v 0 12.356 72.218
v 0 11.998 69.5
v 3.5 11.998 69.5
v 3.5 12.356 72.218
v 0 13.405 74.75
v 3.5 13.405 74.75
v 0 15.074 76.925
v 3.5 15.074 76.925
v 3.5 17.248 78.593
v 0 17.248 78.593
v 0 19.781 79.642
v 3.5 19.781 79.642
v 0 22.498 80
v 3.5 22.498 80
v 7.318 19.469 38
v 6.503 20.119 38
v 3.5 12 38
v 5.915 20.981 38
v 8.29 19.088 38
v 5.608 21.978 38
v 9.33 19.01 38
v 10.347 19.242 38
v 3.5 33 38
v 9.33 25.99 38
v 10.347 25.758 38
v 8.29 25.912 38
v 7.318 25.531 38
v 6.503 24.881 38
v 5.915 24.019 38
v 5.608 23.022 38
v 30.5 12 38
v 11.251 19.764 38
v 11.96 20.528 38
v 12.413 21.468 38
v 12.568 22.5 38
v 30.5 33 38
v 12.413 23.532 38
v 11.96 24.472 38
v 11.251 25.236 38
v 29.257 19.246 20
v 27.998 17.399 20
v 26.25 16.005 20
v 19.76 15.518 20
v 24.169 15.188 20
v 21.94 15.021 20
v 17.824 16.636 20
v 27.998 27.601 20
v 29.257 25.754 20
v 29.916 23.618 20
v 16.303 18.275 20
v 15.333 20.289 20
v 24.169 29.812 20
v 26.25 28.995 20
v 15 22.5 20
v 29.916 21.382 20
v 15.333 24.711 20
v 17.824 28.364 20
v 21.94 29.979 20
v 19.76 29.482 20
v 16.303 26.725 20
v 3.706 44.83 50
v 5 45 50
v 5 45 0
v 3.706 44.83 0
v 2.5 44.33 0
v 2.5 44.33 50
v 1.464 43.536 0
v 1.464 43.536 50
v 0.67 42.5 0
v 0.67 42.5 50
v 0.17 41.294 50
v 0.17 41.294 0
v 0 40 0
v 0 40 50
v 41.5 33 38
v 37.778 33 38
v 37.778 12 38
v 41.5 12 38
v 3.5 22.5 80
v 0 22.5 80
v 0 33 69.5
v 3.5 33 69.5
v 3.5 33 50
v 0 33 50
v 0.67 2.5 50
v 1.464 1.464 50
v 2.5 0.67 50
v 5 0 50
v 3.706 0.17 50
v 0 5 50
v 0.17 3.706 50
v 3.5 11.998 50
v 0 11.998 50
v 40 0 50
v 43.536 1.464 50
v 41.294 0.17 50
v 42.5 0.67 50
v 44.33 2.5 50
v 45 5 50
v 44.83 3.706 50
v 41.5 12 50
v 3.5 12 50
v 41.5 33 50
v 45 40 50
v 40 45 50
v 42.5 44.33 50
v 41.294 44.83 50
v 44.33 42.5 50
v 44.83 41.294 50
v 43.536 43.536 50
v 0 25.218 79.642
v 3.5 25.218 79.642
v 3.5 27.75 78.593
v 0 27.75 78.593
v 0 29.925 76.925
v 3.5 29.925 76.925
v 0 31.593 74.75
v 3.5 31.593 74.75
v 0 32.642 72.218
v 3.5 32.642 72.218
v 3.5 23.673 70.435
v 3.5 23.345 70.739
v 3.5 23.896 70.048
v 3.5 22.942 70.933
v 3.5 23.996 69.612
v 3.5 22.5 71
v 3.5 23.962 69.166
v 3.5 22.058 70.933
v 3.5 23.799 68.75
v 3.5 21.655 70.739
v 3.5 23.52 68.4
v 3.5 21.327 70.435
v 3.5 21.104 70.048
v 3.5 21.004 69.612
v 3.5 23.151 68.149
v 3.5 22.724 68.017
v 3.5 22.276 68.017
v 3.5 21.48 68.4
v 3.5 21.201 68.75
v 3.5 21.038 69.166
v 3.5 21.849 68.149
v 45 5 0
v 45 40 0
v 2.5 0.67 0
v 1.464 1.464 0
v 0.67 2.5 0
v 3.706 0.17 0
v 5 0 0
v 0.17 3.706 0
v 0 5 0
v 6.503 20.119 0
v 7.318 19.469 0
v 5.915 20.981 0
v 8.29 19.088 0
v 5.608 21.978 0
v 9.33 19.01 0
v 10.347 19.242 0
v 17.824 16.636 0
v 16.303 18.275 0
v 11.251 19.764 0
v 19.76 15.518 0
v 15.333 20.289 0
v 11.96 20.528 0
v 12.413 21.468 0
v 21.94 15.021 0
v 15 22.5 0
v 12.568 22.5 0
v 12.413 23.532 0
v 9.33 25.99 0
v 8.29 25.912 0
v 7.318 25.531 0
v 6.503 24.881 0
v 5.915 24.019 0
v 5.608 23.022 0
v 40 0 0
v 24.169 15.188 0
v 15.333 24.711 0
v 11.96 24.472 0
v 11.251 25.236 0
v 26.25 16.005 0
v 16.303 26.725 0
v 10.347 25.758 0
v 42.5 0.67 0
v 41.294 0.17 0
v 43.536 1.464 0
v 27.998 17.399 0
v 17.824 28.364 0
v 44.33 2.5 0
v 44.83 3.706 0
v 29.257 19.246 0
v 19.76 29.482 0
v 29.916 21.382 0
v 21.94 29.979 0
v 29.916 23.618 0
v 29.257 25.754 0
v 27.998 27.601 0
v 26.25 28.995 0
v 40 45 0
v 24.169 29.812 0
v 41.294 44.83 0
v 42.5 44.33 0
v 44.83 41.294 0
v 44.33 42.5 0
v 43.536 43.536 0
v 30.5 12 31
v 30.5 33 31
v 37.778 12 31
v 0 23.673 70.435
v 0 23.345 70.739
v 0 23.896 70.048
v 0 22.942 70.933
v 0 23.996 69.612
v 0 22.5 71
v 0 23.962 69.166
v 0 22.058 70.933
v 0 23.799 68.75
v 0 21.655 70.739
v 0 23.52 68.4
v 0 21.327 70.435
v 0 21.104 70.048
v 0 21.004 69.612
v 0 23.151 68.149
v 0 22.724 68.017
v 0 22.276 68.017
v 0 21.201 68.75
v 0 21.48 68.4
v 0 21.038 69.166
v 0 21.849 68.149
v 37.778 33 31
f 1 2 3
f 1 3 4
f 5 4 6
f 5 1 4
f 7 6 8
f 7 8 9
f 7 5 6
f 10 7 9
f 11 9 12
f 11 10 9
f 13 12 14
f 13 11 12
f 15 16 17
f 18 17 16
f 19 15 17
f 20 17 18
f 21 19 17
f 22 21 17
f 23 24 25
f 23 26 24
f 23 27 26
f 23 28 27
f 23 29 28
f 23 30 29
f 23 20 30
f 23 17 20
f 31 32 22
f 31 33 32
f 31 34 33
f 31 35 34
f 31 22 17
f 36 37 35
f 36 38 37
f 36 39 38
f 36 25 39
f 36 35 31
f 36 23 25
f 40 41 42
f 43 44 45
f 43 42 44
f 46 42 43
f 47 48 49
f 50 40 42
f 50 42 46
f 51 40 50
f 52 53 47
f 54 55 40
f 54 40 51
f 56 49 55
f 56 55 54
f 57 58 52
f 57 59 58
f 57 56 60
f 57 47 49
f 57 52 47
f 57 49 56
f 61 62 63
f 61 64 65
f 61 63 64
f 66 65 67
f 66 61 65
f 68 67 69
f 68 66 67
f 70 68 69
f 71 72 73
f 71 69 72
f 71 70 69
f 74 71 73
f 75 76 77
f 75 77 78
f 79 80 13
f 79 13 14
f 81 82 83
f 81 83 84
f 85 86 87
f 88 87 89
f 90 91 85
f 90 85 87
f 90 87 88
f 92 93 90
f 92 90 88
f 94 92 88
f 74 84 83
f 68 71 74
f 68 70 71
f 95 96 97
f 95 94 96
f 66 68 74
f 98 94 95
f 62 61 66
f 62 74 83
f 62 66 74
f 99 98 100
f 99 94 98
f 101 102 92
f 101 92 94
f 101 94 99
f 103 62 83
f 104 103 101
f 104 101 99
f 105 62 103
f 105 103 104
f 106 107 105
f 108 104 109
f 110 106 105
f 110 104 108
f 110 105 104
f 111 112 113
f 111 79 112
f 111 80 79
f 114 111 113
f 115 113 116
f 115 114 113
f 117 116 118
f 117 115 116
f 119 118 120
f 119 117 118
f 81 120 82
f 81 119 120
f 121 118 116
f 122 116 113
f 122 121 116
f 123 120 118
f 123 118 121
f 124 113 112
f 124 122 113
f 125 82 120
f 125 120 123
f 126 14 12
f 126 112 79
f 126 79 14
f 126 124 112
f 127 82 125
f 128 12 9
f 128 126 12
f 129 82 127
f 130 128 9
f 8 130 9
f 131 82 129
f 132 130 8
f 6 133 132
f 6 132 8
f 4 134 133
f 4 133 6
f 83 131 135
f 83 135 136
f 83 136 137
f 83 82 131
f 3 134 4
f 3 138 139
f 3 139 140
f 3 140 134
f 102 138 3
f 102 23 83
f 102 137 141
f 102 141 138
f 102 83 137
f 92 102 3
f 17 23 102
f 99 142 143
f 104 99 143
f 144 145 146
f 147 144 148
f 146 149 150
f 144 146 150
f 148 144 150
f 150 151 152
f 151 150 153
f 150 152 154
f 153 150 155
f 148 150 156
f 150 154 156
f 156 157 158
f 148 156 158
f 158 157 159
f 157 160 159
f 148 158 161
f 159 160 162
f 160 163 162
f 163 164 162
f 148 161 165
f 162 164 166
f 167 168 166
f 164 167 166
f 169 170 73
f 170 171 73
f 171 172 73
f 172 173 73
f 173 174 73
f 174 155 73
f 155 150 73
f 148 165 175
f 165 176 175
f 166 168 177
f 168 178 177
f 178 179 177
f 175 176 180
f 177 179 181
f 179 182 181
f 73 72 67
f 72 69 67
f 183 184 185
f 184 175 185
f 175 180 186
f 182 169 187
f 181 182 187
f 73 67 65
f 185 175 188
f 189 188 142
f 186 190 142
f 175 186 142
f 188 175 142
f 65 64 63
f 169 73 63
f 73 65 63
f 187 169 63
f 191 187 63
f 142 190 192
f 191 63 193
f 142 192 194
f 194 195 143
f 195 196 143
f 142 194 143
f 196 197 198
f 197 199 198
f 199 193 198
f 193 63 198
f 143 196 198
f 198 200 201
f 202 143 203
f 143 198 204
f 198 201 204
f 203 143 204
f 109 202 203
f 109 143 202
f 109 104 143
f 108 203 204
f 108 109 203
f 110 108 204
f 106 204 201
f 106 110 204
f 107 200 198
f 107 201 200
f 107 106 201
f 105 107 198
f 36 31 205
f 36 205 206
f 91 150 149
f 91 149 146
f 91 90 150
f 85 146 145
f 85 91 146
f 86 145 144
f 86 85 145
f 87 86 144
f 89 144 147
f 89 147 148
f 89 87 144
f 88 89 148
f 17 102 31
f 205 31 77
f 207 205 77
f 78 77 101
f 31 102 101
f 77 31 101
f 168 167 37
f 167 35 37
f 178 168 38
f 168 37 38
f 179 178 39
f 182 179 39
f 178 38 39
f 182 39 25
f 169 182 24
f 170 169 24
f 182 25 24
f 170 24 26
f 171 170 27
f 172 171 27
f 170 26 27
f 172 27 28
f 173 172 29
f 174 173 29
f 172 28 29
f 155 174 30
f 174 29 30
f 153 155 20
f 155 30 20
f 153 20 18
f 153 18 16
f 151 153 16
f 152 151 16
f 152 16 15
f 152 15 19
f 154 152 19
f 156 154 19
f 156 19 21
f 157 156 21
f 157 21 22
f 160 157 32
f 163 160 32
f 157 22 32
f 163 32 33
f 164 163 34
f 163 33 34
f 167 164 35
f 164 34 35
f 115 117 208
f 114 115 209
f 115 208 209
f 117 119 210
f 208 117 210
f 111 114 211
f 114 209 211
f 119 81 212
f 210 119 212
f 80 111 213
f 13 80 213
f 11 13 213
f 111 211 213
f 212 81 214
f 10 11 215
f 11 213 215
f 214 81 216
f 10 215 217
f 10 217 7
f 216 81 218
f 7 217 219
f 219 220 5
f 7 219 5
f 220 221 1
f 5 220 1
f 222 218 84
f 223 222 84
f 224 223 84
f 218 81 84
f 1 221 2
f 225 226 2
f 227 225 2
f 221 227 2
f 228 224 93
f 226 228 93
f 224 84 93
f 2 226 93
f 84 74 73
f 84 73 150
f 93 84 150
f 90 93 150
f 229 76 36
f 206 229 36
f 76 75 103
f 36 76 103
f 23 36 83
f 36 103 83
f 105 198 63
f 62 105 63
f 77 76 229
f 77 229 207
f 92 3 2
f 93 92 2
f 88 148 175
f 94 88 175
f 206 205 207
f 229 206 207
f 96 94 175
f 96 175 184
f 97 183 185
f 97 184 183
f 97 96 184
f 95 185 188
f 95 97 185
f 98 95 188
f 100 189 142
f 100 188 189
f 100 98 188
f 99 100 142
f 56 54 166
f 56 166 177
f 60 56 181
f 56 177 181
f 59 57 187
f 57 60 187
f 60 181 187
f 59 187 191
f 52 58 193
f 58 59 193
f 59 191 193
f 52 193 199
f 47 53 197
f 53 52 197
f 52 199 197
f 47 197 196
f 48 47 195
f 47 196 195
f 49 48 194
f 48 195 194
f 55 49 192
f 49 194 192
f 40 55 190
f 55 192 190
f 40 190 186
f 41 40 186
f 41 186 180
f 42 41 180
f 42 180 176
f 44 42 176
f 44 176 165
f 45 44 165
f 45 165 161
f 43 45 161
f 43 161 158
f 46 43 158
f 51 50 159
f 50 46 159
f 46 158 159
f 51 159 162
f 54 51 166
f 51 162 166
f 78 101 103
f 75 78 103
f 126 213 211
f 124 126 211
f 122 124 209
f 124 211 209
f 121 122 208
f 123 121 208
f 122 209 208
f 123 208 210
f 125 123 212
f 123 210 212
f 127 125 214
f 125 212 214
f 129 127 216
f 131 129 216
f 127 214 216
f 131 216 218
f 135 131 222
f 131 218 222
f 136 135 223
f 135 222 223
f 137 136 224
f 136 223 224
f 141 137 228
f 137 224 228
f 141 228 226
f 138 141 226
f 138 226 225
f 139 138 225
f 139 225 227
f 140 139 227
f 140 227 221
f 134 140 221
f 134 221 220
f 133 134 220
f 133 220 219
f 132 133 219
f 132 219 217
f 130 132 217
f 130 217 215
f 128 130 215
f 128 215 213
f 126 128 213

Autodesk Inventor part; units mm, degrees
ref_plane "YZ Plane" through (0, 0, 0) normal (1, 0, 0) x (0, 1, 0)
ref_plane "XZ Plane" through (0, 0, 0) normal (0, 1, 0) x (-1, 0, 0)
ref_plane "XY Plane" through (0, 0, 0) normal (0, 0, 1) x (1, 0, 0)
sketch "Sketch1" plane through (0, 0, 0) normal (0, 0, 1) x (1, 0, 0)
  line L0 (0, 0) -> (45, 0)
  line L1 (45, 0) -> (45, 45)
  line L2 (45, 45) -> (0, 45)
  line L3 (0, 45) -> (0, 0)
  dimension "d0" = 45
  dimension "d1" = 45
extrude "Extrusion1" add sketch "Sketch1" along normal blind 50
fillet "Fillet1" radius 5 4 edges at (45, 45, 25) (0, 45, 25) (45, 0, 25) (0, 0, 25)
sketch "Sketch2" plane through (0, 0, 0) normal (0, 0, -1) x (-1, 0, 0)
  line L0 (-45, 5) -> (-45, 40) projected
  line L1 (-45, 22.5) -> (-22.5, 22.5)
  circle A0 centre (-22.5, 22.5) radius 7.5
  point P0 (0, 0)
  dimension "d5" = 22.5
  dimension "d6" = 15
extrude "Extrusion2" cut sketch "Sketch2" against normal blind 20
sketch "Sketch3" plane through (0, 0, 50) normal (0, 0, 1) x (1, 0, 0)
  line L0 (0, 0) -> (3.5, 0)
  line L1 (5, 0) -> (40, 0) projected
  line L2 (3.5, 0) -> (3.5, 12)
  line L3 (3.5, 12) -> (41.5, 12)
  line L4 (41.5, 12) -> (41.5, 33)
  line L5 (41.5, 33) -> (3.5, 33)
  line L6 (3.5, 33) -> (3.5, 12)
  dimension "d11" = 3.5
  dimension "d12" = 12
  dimension "d13" = 38
  dimension "d14" = 21
extrude "Extrusion3" cut sketch "Sketch3" against normal blind 12
sketch "Sketch4" plane through (0, 0, 38) normal (0, 0, 1) x (1, 0, 0)
  line L0 (3.5, 12) -> (3.5, 33) projected
  line L1 (3.5, 22.5) -> (29.5, 22.5)
  line L2 (29.5, 22.5) -> (33.5, 22.5)
  line L3 (3.5, 33) -> (41.5, 33) projected
  line L4 (30.5, 33) -> (37.7775, 33)
  line L5 (37.7775, 33) -> (37.7775, 12)
  line L6 (37.7775, 12) -> (30.5, 12)
  line L7 (30.5, 12) -> (30.5, 33)
  point P0 (0, 0)
  dimension "d20" = 26
  dimension "d21" = 4
extrude "Extrusion4" cut sketch "Sketch4" against normal blind 7 contours L3 L5 L6 L7
sketch "Sketch5" plane through (0, 0, 38) normal (0, 0, 1) x (1, 0, 0)
  circle A0 centre (9.0685, 22.5) radius 3.5
  point P0 (0, 0)
  dimension "d24" = 7
extrude "Extrusion5" cut sketch "Sketch5" against normal blind 40
sketch "Sketch6" plane through (0, 0, 50) normal (0, 0, 1) x (1, 0, 0)
  line L0 (3.5, 33) -> (30.5, 33) projected
  line L1 (3.5, 33) -> (0, 33)
  line L2 (0, 40) -> (0, 5) projected
  line L3 (3.5, 11.9982) -> (0, 11.9982)
  line L4 (0, 33) -> (3.5, 33)
  line L5 (3.5, 33) -> (3.5, 11.9982)
  line L6 (3.5, 11.9982) -> (0, 11.9982)
  line L7 (0, 11.9982) -> (0, 33)
  point P0 (0, 0)
extrude "Extrusion6" add sketch "Sketch6" along normal blind 30
fillet "Fillet2" radius 10.5 2 edges at (1.75, 33, 80) (1.75, 11.9982, 80)
sketch "Sketch7" plane through (0, 5, 0) normal (-1, 0, 0) x (0, 0, 1)
  arc A0 (80, 17.5) -> (69.5, 28) centre (69.5, 17.5) ccw projected
  circle A1 centre (69.5, 17.5) radius 1.5
  point P0 (0, -5)
  dimension "d30" = 3
extrude "Extrusion7" cut sketch "Sketch7" against normal blind 30
properties part number "Motor holder"
